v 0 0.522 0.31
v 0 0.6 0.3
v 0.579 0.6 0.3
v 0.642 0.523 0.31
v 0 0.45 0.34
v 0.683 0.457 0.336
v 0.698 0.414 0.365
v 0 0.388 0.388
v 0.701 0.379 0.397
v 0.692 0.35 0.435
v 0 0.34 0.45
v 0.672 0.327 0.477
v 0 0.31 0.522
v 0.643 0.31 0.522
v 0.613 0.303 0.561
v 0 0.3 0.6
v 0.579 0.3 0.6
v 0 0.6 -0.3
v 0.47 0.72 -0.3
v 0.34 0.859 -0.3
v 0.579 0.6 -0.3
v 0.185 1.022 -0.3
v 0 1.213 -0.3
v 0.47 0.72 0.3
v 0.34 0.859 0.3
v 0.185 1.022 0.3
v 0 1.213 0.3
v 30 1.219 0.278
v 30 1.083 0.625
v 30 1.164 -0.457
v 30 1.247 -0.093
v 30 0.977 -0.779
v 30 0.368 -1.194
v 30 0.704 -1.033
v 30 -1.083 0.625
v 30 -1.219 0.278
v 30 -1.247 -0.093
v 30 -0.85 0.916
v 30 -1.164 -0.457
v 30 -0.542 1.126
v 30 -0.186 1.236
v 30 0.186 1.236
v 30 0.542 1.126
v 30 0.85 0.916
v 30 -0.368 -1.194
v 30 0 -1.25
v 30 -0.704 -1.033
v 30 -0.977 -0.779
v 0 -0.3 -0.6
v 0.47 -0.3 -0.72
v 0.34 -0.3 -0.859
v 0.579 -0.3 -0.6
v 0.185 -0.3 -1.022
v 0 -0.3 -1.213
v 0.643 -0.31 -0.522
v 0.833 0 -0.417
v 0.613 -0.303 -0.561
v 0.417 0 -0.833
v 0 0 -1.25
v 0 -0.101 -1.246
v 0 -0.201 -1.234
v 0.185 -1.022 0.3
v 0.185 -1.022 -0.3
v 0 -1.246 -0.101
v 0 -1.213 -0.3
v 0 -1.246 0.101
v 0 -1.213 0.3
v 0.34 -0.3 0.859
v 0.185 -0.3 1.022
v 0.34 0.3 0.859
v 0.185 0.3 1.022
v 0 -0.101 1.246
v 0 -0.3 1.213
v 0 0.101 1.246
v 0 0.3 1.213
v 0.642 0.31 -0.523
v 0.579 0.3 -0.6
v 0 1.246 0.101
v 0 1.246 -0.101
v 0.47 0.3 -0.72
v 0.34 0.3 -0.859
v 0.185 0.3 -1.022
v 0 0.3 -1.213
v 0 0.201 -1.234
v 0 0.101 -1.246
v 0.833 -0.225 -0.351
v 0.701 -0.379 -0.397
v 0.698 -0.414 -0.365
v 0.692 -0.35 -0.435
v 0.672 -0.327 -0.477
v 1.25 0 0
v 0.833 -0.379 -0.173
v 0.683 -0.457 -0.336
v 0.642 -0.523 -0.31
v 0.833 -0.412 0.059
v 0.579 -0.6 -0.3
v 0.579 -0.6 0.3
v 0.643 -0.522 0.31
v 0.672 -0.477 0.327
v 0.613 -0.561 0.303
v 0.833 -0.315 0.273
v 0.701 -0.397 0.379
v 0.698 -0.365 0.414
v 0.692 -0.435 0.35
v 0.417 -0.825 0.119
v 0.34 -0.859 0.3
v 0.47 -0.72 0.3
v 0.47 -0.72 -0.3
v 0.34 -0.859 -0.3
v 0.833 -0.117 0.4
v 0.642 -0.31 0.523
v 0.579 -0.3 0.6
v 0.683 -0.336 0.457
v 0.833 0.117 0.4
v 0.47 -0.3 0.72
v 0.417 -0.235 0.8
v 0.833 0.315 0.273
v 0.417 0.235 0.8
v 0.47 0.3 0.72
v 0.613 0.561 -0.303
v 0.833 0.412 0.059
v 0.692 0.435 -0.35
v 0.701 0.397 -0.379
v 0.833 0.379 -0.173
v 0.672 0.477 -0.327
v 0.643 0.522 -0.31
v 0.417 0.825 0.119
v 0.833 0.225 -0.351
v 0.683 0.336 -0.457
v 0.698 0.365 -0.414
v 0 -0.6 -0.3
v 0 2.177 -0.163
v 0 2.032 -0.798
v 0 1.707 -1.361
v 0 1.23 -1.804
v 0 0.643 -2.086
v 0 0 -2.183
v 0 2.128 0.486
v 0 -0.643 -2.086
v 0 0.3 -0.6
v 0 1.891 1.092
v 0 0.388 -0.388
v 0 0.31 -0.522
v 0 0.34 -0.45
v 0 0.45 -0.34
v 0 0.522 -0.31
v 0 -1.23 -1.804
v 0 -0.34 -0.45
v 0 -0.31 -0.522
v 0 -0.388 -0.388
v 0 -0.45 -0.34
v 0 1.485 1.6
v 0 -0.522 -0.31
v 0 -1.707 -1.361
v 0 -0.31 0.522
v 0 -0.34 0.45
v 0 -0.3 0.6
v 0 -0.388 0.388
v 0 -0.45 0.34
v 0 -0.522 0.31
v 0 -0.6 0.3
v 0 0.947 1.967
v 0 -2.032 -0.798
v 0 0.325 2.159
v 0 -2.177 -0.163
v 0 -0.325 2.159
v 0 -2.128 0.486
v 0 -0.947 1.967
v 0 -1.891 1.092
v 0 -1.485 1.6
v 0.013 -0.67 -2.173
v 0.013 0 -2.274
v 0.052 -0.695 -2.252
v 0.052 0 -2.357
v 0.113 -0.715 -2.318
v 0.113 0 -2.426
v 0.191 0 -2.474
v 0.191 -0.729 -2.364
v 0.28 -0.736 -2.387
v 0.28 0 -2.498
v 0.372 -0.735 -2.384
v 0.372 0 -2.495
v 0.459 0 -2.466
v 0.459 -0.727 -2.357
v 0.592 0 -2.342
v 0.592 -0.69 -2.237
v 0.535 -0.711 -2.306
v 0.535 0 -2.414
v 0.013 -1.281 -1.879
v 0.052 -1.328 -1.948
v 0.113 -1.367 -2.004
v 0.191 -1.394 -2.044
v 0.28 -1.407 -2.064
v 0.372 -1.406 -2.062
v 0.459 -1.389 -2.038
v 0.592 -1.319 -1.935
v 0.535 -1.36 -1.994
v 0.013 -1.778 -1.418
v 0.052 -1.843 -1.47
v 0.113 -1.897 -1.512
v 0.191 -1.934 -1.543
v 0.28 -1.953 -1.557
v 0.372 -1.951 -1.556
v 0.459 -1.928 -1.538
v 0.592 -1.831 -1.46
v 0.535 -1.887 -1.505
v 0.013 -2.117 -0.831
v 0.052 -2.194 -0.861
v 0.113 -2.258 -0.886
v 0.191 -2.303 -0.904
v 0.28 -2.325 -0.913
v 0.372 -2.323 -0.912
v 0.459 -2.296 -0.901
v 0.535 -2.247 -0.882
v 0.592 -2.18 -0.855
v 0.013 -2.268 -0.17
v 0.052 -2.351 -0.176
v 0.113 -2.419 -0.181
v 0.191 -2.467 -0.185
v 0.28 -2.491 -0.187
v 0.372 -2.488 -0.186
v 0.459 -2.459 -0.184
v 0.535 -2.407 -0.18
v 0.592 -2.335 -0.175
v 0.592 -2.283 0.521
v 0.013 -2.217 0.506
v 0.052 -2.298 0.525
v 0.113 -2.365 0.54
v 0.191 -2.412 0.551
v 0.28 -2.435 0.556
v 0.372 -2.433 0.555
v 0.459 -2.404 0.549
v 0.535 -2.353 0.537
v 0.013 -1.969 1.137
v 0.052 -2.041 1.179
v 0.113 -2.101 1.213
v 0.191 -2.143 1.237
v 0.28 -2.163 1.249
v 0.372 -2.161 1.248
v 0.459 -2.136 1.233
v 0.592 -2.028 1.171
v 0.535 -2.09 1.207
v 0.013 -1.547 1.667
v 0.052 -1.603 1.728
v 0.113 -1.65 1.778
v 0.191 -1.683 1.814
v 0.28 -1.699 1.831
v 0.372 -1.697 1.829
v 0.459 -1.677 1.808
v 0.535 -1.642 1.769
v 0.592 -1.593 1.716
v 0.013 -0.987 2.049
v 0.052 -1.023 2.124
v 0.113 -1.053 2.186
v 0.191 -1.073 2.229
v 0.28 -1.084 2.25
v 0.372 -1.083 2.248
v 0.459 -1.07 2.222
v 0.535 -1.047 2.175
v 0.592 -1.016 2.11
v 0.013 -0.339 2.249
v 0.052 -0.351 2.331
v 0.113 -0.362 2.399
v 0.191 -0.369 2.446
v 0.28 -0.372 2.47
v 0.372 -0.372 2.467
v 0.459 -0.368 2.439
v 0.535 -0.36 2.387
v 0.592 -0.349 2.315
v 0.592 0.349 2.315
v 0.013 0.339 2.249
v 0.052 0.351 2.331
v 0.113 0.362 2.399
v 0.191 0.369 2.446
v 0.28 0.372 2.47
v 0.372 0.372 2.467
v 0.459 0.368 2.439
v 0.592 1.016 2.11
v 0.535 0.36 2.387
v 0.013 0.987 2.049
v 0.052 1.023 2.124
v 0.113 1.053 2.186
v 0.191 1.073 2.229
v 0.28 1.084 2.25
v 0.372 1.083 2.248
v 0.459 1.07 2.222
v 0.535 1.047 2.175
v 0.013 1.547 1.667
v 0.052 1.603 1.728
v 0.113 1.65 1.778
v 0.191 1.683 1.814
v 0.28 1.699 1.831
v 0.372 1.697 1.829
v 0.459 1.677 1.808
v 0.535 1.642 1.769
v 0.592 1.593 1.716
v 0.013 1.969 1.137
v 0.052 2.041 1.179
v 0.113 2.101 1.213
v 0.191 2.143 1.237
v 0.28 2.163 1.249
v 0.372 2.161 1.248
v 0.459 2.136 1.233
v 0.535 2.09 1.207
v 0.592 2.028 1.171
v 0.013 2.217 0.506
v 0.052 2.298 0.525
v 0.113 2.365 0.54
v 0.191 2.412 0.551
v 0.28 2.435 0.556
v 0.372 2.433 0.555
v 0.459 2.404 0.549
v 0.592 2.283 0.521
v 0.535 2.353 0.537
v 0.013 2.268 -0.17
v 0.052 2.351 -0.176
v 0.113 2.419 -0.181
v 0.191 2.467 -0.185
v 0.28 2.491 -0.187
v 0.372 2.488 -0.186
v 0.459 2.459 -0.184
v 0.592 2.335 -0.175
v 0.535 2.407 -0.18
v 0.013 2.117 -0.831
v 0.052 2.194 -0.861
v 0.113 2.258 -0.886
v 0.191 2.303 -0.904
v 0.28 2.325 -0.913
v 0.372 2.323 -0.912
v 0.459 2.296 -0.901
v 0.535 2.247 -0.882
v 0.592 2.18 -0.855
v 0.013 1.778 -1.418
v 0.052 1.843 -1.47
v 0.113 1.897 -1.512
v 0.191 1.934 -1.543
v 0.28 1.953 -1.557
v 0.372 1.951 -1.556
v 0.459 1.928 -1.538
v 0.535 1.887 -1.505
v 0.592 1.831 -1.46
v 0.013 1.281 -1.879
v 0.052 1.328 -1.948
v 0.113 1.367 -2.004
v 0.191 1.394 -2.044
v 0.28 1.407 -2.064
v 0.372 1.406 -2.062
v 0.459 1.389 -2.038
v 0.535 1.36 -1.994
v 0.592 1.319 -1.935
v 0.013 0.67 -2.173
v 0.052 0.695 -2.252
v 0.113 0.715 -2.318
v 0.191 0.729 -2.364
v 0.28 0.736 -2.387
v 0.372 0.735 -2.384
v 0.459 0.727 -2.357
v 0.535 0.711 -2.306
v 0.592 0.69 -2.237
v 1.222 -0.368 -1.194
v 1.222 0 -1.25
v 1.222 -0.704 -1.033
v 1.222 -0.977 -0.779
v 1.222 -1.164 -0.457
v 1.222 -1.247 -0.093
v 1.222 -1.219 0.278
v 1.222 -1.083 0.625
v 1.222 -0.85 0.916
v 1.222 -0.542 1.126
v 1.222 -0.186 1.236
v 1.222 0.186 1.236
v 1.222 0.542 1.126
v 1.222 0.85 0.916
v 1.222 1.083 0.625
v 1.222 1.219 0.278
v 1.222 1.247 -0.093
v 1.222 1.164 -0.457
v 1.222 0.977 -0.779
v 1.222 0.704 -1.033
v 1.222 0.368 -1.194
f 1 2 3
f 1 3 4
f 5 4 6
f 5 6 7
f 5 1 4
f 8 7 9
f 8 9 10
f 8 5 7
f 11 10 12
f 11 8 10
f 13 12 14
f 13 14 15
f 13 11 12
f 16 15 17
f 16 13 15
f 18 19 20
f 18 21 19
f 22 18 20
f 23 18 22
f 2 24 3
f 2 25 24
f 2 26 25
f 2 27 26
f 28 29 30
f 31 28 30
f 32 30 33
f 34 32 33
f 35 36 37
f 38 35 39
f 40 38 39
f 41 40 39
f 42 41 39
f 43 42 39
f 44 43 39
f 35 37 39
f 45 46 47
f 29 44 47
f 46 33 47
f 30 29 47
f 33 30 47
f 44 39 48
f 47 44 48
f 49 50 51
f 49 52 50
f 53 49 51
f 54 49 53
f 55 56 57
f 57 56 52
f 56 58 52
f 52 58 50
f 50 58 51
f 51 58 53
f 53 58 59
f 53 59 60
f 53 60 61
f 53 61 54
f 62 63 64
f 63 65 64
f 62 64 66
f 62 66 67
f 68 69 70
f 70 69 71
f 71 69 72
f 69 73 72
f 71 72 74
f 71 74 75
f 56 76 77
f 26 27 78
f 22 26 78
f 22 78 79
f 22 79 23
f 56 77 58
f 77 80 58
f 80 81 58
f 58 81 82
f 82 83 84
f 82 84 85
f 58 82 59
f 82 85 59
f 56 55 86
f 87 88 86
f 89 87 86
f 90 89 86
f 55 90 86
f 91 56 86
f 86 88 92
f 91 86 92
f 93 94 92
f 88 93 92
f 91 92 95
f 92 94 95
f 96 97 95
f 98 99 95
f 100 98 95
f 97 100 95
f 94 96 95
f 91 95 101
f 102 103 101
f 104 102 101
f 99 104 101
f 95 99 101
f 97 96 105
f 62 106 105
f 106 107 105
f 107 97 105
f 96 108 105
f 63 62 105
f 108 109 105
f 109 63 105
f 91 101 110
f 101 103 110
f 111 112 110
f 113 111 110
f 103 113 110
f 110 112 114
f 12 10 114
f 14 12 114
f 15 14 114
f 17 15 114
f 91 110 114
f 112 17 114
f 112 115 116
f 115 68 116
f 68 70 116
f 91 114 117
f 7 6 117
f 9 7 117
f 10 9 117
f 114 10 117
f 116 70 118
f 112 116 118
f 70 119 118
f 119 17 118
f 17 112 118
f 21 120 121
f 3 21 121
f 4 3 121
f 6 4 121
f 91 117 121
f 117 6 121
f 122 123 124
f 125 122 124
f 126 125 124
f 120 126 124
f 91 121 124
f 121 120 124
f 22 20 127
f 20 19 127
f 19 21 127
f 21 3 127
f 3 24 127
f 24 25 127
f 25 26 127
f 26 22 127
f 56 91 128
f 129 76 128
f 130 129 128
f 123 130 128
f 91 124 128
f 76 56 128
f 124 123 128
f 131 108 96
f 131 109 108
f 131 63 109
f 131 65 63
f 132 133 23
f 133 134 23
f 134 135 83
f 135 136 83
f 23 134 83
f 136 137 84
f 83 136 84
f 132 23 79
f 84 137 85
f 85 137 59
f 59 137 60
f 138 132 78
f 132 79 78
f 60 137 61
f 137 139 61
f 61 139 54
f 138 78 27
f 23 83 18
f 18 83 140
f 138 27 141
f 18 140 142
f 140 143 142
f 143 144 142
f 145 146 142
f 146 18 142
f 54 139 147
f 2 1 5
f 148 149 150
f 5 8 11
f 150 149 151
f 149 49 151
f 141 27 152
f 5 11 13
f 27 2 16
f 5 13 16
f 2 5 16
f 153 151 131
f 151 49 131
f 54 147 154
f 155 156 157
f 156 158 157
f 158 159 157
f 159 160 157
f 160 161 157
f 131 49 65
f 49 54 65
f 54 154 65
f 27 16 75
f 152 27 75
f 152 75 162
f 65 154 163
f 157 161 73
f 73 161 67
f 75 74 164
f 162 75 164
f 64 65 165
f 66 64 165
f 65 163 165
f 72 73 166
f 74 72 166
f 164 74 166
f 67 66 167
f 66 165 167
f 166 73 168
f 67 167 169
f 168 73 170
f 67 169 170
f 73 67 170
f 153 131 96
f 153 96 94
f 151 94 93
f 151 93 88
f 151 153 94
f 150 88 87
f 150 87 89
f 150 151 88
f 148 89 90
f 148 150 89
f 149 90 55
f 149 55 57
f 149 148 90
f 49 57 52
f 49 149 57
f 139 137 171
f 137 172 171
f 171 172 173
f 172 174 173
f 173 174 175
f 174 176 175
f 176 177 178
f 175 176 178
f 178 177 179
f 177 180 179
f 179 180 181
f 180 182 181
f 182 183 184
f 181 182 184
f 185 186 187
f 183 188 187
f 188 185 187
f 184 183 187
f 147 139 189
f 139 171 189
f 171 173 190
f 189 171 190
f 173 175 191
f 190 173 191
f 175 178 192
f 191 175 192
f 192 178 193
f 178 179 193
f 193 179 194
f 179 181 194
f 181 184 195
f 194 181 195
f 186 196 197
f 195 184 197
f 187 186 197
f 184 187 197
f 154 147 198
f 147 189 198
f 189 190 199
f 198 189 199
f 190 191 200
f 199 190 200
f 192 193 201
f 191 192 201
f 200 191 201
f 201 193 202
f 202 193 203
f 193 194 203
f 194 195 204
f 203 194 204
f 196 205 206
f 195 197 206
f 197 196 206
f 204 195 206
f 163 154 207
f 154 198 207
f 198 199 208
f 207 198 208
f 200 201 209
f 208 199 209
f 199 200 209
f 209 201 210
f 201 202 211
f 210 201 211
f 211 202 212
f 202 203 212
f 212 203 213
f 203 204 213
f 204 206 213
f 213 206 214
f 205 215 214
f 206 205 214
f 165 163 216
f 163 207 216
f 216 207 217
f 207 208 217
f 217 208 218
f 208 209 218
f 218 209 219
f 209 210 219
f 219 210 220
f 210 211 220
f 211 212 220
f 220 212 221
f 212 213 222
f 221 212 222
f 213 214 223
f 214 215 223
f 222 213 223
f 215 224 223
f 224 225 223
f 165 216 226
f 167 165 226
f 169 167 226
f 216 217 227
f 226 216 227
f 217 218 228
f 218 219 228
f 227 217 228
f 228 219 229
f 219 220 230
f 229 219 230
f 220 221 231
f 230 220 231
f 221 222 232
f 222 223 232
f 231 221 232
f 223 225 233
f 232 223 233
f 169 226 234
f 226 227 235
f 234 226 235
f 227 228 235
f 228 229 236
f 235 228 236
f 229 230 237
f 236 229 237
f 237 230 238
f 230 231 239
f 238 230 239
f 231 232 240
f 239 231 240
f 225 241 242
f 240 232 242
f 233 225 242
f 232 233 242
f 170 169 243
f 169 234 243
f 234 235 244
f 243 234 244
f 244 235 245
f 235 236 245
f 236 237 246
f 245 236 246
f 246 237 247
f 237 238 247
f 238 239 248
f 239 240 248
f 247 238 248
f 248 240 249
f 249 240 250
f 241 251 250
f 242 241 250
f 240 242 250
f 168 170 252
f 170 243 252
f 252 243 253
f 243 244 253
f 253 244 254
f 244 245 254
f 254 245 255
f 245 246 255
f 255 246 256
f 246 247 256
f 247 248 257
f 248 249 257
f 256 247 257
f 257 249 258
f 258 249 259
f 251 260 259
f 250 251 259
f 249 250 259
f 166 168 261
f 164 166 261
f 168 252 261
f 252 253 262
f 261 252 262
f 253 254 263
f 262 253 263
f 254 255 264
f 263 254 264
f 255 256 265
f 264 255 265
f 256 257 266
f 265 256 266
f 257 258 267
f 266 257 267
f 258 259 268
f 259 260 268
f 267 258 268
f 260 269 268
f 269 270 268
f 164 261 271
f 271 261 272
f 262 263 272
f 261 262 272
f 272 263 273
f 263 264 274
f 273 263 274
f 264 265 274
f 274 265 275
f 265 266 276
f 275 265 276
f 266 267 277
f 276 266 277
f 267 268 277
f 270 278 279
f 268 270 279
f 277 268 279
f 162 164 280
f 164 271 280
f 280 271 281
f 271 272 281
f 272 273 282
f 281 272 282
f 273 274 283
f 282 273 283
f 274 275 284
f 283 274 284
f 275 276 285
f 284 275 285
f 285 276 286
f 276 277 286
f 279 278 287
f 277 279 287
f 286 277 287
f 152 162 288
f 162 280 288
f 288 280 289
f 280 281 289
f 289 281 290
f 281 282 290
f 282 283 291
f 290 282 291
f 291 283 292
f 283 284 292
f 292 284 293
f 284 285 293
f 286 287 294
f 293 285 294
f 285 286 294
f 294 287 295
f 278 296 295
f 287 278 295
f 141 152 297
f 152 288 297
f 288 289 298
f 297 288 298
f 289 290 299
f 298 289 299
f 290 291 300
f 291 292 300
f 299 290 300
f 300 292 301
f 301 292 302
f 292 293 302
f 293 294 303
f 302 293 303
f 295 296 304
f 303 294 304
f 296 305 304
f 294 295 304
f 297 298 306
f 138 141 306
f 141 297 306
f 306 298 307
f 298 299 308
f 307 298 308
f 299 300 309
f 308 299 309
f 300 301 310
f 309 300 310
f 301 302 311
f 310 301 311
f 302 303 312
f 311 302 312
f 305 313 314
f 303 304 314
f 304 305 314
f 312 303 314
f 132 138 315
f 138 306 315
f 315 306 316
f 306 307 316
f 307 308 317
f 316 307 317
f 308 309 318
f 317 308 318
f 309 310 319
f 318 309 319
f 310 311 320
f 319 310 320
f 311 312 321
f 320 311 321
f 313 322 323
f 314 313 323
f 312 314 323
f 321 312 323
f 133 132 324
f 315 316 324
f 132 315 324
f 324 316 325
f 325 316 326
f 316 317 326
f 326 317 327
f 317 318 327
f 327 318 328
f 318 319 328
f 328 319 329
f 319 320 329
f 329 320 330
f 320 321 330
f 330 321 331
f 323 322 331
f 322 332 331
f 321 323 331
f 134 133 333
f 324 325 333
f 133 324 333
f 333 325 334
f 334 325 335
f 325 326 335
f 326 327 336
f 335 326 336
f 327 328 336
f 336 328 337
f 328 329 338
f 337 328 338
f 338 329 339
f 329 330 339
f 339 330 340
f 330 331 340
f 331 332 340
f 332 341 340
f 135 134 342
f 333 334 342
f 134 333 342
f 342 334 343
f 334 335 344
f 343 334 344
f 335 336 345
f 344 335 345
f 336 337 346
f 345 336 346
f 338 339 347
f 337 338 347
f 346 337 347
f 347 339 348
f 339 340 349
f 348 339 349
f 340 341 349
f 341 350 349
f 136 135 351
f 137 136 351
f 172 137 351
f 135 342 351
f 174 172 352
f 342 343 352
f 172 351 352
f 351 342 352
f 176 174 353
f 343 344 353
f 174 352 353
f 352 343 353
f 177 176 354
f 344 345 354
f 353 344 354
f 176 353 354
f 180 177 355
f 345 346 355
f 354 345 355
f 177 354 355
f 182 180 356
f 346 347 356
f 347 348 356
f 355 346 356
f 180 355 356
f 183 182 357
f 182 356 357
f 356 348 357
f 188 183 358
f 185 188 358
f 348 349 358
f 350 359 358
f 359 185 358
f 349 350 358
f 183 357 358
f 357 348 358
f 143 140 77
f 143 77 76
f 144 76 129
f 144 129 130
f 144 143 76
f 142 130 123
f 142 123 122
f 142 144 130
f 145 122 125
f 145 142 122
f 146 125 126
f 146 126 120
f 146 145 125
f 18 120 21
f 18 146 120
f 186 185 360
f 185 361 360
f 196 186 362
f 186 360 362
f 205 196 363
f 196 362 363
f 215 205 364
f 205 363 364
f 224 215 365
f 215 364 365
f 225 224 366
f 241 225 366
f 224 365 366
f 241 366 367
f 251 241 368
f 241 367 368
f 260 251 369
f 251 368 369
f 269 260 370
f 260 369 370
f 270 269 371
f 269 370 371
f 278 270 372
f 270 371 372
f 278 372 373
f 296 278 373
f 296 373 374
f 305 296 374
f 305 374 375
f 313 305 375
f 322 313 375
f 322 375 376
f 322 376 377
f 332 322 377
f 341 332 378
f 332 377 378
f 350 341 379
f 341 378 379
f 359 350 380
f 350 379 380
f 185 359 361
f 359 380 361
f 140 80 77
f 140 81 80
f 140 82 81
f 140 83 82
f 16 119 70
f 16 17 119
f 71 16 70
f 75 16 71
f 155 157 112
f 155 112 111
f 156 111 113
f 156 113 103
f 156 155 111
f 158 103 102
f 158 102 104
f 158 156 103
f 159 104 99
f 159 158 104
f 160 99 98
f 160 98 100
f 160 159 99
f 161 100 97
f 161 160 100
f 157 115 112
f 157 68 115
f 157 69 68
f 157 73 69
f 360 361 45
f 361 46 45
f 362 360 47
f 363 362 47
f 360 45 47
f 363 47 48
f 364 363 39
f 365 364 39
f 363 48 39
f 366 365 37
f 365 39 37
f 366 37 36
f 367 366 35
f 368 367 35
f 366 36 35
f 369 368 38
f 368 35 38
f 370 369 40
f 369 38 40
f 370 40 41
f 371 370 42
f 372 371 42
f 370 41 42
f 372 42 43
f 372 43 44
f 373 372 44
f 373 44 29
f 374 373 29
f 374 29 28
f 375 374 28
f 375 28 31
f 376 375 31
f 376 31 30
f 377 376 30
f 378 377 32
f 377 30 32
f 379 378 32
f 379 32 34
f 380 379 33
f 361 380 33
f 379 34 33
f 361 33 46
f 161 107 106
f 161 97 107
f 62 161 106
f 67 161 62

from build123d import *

# Parameters (mm, degrees)
RESSALTO_EXTRUS_O1_DEPTH = 1
PADR_OCIRCULAR1_COUNT    = 4


with BuildPart() as part:
    # Esboço1 → Revolução1 (revolve)
    with BuildSketch(Plane(origin=(0, 0, 0), x_dir=(1, 0, 0), z_dir=(0, 1, 0))):
        with BuildLine():
            Line((1.221687836, 1.25), (30, 1.25))
            Line((30, 1.25), (30, 0))
            Line((30, 0), (1.25, 0))
            Line((1.25, 0), (0, 1.25))
            Line((0, 1.25), (0, 2.183012702))
            ThreePointArc((0, 2.183012702), (0.234944948, 2.48919892), (0.591506351, 2.341506351))
            Line((0.591506351, 2.341506351), (1.221687836, 1.25))
        make_face()
    revolve(axis=Axis((0, 0, 0), (-1, 0, 0)))

    # Esboço2 → Ressalto-extrusão1 (add)
    with BuildSketch(Plane(origin=(0, 0, 0), x_dir=(0, 0, -1), z_dir=(1, 0, 0))):
        with BuildLine():
            Line((-0.3, 1.21346611), (-0.3, 0.6))
            ThreePointArc((-0.3, 0.6), (-0.387867966, 0.387867966), (-0.6, 0.3))
            Line((-0.6, 0.3), (-1.21346611, 0.3))
            ThreePointArc((-1.21346611, 0.3), (-0.924029762, 0.924029762), (-0.3, 1.21346611))
        make_face()
    ressalto_extrus_o1 = extrude(amount=RESSALTO_EXTRUS_O1_DEPTH)

    # PadrãoCircular1: Ressalto-extrusão1 ×4 about axis
    padr_ocircular1_axis = Axis((0, 0, 0), (1, 0, 0))
    for i in range(1, PADR_OCIRCULAR1_COUNT):
        add(ressalto_extrus_o1.rotate(padr_ocircular1_axis, i * 360 / PADR_OCIRCULAR1_COUNT))


solid = part.part
